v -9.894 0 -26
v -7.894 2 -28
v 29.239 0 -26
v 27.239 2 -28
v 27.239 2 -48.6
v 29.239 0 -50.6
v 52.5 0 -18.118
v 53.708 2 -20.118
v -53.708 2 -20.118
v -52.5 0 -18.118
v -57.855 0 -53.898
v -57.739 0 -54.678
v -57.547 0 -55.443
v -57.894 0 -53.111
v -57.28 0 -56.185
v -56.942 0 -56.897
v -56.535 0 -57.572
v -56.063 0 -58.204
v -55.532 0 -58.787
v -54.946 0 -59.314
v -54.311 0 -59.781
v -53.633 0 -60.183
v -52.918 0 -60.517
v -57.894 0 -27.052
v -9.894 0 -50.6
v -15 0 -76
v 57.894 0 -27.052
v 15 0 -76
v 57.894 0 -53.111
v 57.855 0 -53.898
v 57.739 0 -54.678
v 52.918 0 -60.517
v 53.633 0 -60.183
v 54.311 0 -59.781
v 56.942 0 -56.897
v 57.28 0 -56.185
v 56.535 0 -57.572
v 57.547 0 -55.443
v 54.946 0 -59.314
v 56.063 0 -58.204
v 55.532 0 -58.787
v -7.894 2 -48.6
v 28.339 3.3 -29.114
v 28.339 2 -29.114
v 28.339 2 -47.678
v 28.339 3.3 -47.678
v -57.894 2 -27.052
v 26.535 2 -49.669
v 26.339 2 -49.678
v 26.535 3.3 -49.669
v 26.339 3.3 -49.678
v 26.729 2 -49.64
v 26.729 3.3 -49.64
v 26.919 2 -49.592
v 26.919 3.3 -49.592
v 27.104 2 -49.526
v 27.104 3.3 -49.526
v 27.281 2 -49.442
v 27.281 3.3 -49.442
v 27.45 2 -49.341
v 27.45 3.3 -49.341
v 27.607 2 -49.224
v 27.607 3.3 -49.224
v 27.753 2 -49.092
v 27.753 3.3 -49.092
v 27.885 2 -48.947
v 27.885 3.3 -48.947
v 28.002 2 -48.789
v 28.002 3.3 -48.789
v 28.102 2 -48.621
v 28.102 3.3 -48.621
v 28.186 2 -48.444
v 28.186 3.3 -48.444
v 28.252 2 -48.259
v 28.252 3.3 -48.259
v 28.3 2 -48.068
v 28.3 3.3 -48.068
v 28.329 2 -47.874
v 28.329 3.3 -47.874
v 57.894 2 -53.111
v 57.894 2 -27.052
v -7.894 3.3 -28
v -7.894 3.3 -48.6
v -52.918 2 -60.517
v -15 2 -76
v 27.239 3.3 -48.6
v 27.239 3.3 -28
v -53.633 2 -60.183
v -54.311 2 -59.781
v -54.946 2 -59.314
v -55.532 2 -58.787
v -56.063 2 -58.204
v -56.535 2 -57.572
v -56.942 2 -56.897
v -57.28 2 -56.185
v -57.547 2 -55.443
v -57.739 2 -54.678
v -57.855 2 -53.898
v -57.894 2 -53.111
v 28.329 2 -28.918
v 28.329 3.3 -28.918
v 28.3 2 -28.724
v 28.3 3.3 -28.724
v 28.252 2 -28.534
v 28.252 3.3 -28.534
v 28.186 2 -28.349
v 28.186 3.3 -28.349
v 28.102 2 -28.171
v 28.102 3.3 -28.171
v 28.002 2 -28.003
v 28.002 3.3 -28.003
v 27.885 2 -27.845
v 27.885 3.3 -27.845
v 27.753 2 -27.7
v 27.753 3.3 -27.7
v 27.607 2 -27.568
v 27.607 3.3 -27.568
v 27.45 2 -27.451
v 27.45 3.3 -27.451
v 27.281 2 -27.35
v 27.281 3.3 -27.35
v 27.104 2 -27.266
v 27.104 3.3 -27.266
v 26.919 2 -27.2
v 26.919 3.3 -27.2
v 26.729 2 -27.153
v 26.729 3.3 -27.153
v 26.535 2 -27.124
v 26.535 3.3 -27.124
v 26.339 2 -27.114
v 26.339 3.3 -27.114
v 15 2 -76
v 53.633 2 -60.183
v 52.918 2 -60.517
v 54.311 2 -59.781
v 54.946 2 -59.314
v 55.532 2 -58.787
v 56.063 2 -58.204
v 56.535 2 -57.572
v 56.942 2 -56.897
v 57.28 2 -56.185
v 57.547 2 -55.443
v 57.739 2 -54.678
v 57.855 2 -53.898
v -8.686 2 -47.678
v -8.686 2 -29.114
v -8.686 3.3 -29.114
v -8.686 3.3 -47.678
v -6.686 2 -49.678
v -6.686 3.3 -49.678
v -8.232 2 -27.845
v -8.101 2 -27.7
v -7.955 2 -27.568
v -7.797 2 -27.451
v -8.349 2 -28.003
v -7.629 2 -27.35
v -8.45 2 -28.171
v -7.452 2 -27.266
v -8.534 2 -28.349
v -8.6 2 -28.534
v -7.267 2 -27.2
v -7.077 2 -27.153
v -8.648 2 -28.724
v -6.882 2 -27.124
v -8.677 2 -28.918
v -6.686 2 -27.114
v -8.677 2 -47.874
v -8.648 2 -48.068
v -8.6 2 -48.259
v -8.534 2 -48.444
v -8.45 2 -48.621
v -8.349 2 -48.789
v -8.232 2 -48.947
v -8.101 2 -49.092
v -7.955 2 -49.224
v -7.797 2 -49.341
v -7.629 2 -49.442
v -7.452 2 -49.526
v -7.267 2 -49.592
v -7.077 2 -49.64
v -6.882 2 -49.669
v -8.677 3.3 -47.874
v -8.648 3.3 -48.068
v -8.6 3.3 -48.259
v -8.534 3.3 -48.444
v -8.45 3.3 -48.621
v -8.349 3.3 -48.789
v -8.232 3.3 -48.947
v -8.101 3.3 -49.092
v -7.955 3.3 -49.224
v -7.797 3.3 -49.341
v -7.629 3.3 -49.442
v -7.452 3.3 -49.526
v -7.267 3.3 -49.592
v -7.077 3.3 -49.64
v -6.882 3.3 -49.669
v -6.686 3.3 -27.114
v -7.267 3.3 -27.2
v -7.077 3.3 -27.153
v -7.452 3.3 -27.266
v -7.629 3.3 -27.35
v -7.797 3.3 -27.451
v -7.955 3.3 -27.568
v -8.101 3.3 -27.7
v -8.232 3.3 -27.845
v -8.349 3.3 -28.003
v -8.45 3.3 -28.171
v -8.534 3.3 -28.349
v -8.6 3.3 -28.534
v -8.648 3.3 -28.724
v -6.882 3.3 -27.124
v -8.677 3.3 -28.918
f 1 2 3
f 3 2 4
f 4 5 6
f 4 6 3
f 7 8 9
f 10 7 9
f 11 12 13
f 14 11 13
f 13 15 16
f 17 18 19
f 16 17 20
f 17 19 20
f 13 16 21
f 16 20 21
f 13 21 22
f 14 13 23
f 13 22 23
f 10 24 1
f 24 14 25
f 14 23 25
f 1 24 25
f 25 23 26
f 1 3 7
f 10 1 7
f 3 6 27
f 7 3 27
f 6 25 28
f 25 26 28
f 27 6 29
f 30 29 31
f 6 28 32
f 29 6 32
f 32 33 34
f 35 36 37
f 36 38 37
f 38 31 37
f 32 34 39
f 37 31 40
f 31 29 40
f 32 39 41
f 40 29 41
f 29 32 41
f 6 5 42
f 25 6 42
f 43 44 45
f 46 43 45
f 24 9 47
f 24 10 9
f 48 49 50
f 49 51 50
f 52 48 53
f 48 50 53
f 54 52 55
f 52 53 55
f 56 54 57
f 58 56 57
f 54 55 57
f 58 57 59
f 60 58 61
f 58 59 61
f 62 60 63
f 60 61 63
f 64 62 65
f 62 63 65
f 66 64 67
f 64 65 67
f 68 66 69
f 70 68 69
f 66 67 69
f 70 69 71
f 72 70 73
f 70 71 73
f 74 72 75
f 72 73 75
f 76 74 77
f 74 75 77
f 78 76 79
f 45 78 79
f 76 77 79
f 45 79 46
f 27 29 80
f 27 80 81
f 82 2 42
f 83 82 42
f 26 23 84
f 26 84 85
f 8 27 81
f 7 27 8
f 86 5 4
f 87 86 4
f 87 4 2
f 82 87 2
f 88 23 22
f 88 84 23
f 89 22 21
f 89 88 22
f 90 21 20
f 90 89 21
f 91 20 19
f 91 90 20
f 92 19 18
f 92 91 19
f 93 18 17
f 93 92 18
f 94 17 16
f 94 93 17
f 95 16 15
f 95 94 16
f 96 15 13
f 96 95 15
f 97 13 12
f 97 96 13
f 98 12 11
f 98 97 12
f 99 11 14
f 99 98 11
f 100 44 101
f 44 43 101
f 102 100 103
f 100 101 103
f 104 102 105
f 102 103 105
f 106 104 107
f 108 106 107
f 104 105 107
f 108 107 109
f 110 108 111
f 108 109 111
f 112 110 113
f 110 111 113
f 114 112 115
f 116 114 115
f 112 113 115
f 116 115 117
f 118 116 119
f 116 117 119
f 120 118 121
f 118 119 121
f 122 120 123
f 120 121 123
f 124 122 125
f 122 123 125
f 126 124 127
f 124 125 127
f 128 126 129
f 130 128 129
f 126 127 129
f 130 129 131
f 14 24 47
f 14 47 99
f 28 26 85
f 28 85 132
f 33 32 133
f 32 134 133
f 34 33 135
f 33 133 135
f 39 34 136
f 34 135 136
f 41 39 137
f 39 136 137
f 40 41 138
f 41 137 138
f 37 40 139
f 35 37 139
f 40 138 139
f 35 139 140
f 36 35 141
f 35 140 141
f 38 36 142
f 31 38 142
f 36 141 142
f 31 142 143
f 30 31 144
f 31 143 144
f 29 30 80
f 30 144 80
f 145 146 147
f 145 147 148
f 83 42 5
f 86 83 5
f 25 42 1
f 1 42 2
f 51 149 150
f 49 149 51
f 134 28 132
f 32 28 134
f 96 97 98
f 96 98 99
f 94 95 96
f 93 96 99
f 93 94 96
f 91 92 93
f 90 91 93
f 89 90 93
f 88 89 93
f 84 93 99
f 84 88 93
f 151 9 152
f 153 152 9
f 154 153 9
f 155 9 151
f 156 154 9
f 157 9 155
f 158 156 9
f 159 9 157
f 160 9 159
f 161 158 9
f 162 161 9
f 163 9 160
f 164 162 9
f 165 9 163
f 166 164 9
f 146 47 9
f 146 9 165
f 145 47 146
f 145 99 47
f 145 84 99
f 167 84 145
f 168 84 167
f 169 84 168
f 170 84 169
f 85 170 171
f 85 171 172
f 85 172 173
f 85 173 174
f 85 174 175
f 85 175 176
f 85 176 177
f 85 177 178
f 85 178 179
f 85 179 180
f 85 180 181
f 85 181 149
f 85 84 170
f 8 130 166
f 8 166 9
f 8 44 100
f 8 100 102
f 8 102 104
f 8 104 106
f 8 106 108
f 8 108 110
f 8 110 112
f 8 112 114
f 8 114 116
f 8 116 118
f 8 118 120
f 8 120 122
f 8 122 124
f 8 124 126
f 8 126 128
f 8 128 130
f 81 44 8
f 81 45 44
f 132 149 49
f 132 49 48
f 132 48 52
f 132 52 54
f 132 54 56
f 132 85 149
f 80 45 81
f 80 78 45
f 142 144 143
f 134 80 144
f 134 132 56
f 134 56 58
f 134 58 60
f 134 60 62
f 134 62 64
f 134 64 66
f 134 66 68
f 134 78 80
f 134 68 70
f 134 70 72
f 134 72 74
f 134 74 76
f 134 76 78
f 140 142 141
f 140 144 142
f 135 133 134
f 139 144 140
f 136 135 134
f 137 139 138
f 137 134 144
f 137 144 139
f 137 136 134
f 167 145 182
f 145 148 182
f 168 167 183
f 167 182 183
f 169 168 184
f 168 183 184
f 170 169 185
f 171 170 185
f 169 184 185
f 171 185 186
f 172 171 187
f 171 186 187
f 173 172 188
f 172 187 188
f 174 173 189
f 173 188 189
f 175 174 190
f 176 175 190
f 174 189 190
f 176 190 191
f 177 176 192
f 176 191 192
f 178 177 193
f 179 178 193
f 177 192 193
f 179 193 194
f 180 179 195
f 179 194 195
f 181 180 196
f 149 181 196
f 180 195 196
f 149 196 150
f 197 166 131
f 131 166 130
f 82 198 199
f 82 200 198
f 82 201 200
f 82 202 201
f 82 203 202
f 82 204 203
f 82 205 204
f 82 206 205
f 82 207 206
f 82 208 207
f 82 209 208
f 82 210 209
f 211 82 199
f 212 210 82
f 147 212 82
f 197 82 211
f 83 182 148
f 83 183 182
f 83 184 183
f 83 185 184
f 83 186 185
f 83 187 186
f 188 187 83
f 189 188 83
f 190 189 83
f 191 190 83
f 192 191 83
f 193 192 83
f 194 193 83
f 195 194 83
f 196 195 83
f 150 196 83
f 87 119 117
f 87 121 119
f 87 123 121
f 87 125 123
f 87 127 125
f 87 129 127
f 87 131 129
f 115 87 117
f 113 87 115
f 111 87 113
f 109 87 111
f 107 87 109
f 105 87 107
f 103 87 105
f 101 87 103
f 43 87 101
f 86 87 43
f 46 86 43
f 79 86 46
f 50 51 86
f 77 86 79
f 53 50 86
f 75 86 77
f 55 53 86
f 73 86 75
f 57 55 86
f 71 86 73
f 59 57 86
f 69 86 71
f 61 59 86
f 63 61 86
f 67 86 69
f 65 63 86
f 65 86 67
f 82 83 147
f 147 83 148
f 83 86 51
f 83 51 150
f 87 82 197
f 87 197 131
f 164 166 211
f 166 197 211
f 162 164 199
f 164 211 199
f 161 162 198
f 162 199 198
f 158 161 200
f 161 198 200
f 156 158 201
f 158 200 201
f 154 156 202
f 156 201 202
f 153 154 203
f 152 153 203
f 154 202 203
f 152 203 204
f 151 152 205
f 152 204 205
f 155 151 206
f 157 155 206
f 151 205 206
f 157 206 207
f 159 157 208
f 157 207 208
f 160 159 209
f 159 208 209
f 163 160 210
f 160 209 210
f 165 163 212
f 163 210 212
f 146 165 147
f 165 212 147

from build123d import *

# Parameters (mm, degrees)
SKETCH2_W           = 33
SKETCH2_H           = 17.000000000000007
BOSS_EXTRUDE1_DEPTH = 2
FILLET1_R           = 8
FILLET2_R           = 8
CHAMFER1_SIZE       = 2
CUT_EXTRUDE2_DEPTH  = 12
SKETCH6_W           = 1.2612446076729746
SKETCH6_H           = 17.000000000000007
BOSS_EXTRUDE3_DEPTH = 2
SKETCH8_W           = 37.024907352098374
SKETCH8_H           = 22.564000776868035
BOSS_EXTRUDE4_DEPTH = 1.3
FILLET4_R           = 2
FILLET5_R           = 2
FILLET6_R           = 2
FILLET7_R           = 2
CHAMFER2_SIZE       = 2
CHAMFER3_SIZE       = 2
CHAMFER4_SIZE       = 2
CHAMFER5_SIZE       = 2


with BuildPart() as part:
    # Sketch2 → Boss-Extrude1 (new body)
    with BuildSketch(Plane(origin=(0, 0, 0), x_dir=(1, 0, 0), z_dir=(0, 1, 0))):
        Polygon((-15.000000000000073, 76.00000000000003), (15.000000000000004, 76.00000000000003), (57.894125564998674, 58.48538895430336), (57.894125564998674, 27.05184462316343), (52.49999999999998, 18.118100444839456), (-52.50000000000002, 18.118100444839435), (-57.89412556499873, 27.051844623163408), (-57.894125564998745, 58.48538895430333), align=None)
        with Locations((11.999999999999982, 36.50000000000003)):
            Rectangle(SKETCH2_W, SKETCH2_H, mode=Mode.SUBTRACT)
    extrude(amount=BOSS_EXTRUDE1_DEPTH)

    # Fillet1
    fillet1_edges = [part.edges().sort_by_distance(p)[0] for p in [
        (57.894125564998674, 1, -58.48538895430336),
    ]]
    fillet(fillet1_edges, radius=FILLET1_R)

    # Fillet2
    fillet2_edges = [part.edges().sort_by_distance(p)[0] for p in [
        (-57.894125564998745, 1, -58.48538895430333),
    ]]
    fillet(fillet2_edges, radius=FILLET2_R)

    # Chamfer1
    chamfer1_edges = [part.edges().sort_by_distance(p)[0] for p in [
        (-2.132e-14, 2, -18.118100444839445),
    ]]
    chamfer(chamfer1_edges, length=CHAMFER1_SIZE - 0.0001)  # a hair under: the kernel refuses the full size

    # Sketch3 → Cut-Extrude2 (cut)
    with BuildSketch(Plane(origin=(0, 2, 0), x_dir=(1, 0, 0), z_dir=(0, 1, 0))):
        Polygon((-7.894125564998744, 48.60000000000001), (-7.894125564998744, 28.000000000000025), (-4.500000000000018, 28.000000000000025), (-4.500000000000018, 45.00000000000003), (-4.500000000000016, 48.60000000000002), align=None)
        Polygon((-4.500000000000018, 45.00000000000003), (27.238755392327008, 45.00000000000003), (27.238755392327008, 48.600000000000016), (-4.500000000000016, 48.60000000000002), align=None)
    extrude(amount=-CUT_EXTRUDE2_DEPTH, mode=Mode.SUBTRACT)

    # Sketch6 → Boss-Extrude3 (add)
    with BuildSketch(Plane(origin=(0, 2, 0), x_dir=(1, 0, 0), z_dir=(0, 1, 0))):
        with Locations((27.869377696163497, 36.50000000000003)):
            Rectangle(SKETCH6_W, SKETCH6_H)
    extrude(amount=-BOSS_EXTRUDE3_DEPTH)

    # Sketch8 → Boss-Extrude4 (add)
    with BuildSketch(Plane(origin=(0, 2, 0), x_dir=(1, 0, 0), z_dir=(0, 1, 0))):
        with Locations((9.826111603405227, 38.39621794248441)):
            Rectangle(SKETCH8_W, SKETCH8_H)
        Polygon((-7.894125564998744, 48.60000000000001), (27.238755392327008, 48.600000000000016), (27.238755392327008, 28.000000000000025), (-7.894125564998744, 28.000000000000025), align=None, mode=Mode.SUBTRACT)
    extrude(amount=BOSS_EXTRUDE4_DEPTH)

    # Fillet4
    fillet4_edges = [part.edges().sort_by_distance(p)[0] for p in [
        (-8.68634207264396, 2.65, -49.67821833091842),
    ]]
    fillet(fillet4_edges, radius=FILLET4_R)

    # Fillet5
    fillet5_edges = [part.edges().sort_by_distance(p)[0] for p in [
        (28.338565279454414, 2.65, -49.67821833091842),
    ]]
    fillet(fillet5_edges, radius=FILLET5_R)

    # Fillet6
    fillet6_edges = [part.edges().sort_by_distance(p)[0] for p in [
        (28.338565279454414, 2.65, -27.11421755405039),
    ]]
    fillet(fillet6_edges, radius=FILLET6_R)

    # Fillet7
    fillet7_edges = [part.edges().sort_by_distance(p)[0] for p in [
        (-8.68634207264396, 2.65, -27.11421755405039),
    ]]
    fillet(fillet7_edges, radius=FILLET7_R)

    # Chamfer2
    chamfer2_edges = [part.edges().sort_by_distance(p)[0] for p in [
        (27.238755392327008, 0, -38.30000000000002),
    ]]
    chamfer(chamfer2_edges, length=CHAMFER2_SIZE)

    # Chamfer3
    chamfer3_edges = [part.edges().sort_by_distance(p)[0] for p in [
        (10.672314913664133, 0, -28.000000000000025),
    ]]
    chamfer(chamfer3_edges, length=CHAMFER3_SIZE)

    # Chamfer4
    chamfer4_edges = [part.edges().sort_by_distance(p)[0] for p in [
        (-7.894125564998744, 0, -37.30000000000002),
    ]]
    chamfer(chamfer4_edges, length=CHAMFER4_SIZE)

    # Chamfer5
    chamfer5_edges = [part.edges().sort_by_distance(p)[0] for p in [
        (9.672314913664131, 0, -48.60000000000009),
    ]]
    chamfer(chamfer5_edges, length=CHAMFER5_SIZE)


solid = part.part
